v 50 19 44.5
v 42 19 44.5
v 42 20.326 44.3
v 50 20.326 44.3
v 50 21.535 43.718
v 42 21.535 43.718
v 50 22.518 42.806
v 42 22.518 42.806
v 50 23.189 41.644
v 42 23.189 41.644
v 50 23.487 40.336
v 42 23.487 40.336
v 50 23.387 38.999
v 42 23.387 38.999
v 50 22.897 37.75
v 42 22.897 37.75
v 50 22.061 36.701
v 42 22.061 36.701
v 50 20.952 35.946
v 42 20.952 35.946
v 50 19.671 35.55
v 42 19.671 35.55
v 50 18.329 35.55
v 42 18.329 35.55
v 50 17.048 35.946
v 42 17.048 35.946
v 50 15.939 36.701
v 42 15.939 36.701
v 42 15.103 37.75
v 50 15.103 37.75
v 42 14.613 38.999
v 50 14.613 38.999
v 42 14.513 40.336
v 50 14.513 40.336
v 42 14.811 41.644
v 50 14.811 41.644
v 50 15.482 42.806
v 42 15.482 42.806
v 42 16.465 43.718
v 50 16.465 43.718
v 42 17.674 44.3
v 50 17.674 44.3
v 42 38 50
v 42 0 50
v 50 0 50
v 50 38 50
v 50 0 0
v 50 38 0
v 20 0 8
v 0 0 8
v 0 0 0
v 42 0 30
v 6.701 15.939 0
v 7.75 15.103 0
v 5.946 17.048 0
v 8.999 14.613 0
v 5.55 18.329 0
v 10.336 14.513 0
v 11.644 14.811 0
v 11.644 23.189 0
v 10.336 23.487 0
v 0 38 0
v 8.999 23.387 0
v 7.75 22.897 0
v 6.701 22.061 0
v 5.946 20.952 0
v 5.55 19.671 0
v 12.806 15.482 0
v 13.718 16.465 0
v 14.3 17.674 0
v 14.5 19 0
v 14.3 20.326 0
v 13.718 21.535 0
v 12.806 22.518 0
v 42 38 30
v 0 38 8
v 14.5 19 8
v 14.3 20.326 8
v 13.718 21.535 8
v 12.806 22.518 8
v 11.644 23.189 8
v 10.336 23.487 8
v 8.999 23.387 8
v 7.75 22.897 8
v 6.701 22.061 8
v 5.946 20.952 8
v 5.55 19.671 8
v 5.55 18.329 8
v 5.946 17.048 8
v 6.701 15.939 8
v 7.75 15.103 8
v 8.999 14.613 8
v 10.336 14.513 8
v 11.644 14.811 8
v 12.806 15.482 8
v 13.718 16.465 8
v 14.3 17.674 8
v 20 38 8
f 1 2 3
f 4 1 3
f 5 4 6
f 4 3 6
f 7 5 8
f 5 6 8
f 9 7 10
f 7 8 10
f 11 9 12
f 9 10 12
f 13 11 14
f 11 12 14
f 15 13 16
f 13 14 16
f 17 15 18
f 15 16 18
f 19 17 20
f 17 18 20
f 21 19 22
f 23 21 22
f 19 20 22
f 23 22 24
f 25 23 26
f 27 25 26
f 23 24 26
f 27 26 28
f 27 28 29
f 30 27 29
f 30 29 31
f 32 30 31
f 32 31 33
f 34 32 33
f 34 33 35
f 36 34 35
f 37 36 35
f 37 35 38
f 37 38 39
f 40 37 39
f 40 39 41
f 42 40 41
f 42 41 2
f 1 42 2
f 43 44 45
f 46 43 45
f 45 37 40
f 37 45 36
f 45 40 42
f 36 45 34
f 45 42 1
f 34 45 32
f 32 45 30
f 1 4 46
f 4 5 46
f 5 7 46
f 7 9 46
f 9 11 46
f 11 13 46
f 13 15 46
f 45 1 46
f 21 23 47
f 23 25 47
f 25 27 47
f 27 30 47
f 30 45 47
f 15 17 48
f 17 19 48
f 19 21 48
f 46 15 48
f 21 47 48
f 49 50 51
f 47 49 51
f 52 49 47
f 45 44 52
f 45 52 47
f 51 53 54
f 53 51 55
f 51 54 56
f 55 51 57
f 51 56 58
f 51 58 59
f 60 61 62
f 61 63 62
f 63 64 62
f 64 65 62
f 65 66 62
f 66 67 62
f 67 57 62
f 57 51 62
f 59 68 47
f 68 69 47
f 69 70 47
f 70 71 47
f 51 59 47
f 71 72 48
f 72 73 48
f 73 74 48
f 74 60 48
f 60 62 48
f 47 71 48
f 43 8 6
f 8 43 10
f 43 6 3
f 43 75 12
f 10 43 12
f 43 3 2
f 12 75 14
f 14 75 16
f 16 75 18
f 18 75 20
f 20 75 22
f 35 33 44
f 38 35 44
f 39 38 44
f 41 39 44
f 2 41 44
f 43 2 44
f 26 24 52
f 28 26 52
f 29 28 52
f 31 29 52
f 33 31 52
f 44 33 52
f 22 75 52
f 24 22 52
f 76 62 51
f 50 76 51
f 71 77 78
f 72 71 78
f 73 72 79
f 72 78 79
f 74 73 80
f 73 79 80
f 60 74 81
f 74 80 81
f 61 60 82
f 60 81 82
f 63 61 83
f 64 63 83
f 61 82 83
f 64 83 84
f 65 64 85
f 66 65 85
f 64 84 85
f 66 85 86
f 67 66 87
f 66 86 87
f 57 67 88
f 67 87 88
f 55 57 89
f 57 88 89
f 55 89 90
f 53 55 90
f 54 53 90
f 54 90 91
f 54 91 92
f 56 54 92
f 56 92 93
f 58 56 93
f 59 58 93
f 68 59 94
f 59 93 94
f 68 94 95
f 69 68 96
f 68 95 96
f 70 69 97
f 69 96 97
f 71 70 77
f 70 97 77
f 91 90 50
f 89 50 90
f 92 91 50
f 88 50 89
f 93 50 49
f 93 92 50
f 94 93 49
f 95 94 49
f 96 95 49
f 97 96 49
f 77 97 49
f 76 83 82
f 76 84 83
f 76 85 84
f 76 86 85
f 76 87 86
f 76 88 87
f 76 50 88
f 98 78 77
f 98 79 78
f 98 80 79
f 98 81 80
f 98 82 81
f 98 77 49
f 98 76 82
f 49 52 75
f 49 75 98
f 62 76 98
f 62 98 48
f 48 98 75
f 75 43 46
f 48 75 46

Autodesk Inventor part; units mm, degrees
ref_plane "YZ Plane" through (0, 0, 0) normal (1, 0, 0) x (0, 1, 0)
ref_plane "XZ Plane" through (0, 0, 0) normal (0, 1, 0) x (-1, 0, 0)
ref_plane "XY Plane" through (0, 0, 0) normal (0, 0, 1) x (1, 0, 0)
sketch "Sketch1" plane through (0, 0, 0) normal (0, 0, 1) x (1, 0, 0)
  line L0 (0, 0) -> (50, 0)
  line L1 (50, 0) -> (50, 38)
  line L2 (50, 38) -> (0, 38)
  line L3 (0, 38) -> (0, 0)
  dimension "d0" = 38
  dimension "d3" = 50
extrude "Extrusion1" add sketch "Sketch1" along normal blind 8
sketch "Sketch2" plane through (0, 0, 8) normal (0, 0, 1) x (1, 0, 0)
  line L0 (50, 0) -> (50, 38) projected
  line L1 (0, 0) -> (50, 0) projected
  line L2 (50, 38) -> (42, 38)
  line L3 (42, 38) -> (42, 0)
  line L4 (42, 0) -> (50, 0)
  line L5 (50, 0) -> (50, 38)
  dimension "d4" = 8
extrude "Extrusion2" add sketch "Sketch2" along normal blind 42
sketch "Sketch3" plane through (0, 0, 0) normal (0, -1, 0) x (1, 0, 0)
  line L0 (42, 8) -> (42, 50) projected
  line L1 (42, 30) -> (20, 8)
  line L2 (0, 8) -> (42, 8) projected
  line L3 (0, 0) -> (50, 0) projected
  line L4 (50, 0) -> (50, 50) projected
  dimension "d7" = 30
  dimension "d8" = 30
extrude "Extrusion3" add sketch "Sketch3" against normal up to surface (38 mm away)
sketch "Sketch4" plane through (42, 0, 50) normal (-1, 0, 0) x (0, 0, 1)
  circle A0 centre (-10, 19) radius 4.5
  line L0 (0, 38) -> (0, 0) projected
  line L1 (-20, 38) -> (0, 38) projected
  point P0 (-50, 0)
  dimension "d11" = 10
  dimension "d12" = 19
  dimension "d13" = 9
extrude "Extrusion4" cut sketch "Sketch4" against normal through all
sketch "Sketch5" plane through (0, 0, 8) normal (0, 0, 1) x (1, 0, 0)
  circle A0 centre (10, 19) radius 4.5
  line L0 (0, 38) -> (0, 0) projected
  line L1 (0, 0) -> (20, 0) projected
  dimension "d16" = 10
  dimension "d17" = 19
  dimension "d18" = 9
extrude "Extrusion5" cut sketch "Sketch5" against normal blind 10
properties part number "KeNhom40"
